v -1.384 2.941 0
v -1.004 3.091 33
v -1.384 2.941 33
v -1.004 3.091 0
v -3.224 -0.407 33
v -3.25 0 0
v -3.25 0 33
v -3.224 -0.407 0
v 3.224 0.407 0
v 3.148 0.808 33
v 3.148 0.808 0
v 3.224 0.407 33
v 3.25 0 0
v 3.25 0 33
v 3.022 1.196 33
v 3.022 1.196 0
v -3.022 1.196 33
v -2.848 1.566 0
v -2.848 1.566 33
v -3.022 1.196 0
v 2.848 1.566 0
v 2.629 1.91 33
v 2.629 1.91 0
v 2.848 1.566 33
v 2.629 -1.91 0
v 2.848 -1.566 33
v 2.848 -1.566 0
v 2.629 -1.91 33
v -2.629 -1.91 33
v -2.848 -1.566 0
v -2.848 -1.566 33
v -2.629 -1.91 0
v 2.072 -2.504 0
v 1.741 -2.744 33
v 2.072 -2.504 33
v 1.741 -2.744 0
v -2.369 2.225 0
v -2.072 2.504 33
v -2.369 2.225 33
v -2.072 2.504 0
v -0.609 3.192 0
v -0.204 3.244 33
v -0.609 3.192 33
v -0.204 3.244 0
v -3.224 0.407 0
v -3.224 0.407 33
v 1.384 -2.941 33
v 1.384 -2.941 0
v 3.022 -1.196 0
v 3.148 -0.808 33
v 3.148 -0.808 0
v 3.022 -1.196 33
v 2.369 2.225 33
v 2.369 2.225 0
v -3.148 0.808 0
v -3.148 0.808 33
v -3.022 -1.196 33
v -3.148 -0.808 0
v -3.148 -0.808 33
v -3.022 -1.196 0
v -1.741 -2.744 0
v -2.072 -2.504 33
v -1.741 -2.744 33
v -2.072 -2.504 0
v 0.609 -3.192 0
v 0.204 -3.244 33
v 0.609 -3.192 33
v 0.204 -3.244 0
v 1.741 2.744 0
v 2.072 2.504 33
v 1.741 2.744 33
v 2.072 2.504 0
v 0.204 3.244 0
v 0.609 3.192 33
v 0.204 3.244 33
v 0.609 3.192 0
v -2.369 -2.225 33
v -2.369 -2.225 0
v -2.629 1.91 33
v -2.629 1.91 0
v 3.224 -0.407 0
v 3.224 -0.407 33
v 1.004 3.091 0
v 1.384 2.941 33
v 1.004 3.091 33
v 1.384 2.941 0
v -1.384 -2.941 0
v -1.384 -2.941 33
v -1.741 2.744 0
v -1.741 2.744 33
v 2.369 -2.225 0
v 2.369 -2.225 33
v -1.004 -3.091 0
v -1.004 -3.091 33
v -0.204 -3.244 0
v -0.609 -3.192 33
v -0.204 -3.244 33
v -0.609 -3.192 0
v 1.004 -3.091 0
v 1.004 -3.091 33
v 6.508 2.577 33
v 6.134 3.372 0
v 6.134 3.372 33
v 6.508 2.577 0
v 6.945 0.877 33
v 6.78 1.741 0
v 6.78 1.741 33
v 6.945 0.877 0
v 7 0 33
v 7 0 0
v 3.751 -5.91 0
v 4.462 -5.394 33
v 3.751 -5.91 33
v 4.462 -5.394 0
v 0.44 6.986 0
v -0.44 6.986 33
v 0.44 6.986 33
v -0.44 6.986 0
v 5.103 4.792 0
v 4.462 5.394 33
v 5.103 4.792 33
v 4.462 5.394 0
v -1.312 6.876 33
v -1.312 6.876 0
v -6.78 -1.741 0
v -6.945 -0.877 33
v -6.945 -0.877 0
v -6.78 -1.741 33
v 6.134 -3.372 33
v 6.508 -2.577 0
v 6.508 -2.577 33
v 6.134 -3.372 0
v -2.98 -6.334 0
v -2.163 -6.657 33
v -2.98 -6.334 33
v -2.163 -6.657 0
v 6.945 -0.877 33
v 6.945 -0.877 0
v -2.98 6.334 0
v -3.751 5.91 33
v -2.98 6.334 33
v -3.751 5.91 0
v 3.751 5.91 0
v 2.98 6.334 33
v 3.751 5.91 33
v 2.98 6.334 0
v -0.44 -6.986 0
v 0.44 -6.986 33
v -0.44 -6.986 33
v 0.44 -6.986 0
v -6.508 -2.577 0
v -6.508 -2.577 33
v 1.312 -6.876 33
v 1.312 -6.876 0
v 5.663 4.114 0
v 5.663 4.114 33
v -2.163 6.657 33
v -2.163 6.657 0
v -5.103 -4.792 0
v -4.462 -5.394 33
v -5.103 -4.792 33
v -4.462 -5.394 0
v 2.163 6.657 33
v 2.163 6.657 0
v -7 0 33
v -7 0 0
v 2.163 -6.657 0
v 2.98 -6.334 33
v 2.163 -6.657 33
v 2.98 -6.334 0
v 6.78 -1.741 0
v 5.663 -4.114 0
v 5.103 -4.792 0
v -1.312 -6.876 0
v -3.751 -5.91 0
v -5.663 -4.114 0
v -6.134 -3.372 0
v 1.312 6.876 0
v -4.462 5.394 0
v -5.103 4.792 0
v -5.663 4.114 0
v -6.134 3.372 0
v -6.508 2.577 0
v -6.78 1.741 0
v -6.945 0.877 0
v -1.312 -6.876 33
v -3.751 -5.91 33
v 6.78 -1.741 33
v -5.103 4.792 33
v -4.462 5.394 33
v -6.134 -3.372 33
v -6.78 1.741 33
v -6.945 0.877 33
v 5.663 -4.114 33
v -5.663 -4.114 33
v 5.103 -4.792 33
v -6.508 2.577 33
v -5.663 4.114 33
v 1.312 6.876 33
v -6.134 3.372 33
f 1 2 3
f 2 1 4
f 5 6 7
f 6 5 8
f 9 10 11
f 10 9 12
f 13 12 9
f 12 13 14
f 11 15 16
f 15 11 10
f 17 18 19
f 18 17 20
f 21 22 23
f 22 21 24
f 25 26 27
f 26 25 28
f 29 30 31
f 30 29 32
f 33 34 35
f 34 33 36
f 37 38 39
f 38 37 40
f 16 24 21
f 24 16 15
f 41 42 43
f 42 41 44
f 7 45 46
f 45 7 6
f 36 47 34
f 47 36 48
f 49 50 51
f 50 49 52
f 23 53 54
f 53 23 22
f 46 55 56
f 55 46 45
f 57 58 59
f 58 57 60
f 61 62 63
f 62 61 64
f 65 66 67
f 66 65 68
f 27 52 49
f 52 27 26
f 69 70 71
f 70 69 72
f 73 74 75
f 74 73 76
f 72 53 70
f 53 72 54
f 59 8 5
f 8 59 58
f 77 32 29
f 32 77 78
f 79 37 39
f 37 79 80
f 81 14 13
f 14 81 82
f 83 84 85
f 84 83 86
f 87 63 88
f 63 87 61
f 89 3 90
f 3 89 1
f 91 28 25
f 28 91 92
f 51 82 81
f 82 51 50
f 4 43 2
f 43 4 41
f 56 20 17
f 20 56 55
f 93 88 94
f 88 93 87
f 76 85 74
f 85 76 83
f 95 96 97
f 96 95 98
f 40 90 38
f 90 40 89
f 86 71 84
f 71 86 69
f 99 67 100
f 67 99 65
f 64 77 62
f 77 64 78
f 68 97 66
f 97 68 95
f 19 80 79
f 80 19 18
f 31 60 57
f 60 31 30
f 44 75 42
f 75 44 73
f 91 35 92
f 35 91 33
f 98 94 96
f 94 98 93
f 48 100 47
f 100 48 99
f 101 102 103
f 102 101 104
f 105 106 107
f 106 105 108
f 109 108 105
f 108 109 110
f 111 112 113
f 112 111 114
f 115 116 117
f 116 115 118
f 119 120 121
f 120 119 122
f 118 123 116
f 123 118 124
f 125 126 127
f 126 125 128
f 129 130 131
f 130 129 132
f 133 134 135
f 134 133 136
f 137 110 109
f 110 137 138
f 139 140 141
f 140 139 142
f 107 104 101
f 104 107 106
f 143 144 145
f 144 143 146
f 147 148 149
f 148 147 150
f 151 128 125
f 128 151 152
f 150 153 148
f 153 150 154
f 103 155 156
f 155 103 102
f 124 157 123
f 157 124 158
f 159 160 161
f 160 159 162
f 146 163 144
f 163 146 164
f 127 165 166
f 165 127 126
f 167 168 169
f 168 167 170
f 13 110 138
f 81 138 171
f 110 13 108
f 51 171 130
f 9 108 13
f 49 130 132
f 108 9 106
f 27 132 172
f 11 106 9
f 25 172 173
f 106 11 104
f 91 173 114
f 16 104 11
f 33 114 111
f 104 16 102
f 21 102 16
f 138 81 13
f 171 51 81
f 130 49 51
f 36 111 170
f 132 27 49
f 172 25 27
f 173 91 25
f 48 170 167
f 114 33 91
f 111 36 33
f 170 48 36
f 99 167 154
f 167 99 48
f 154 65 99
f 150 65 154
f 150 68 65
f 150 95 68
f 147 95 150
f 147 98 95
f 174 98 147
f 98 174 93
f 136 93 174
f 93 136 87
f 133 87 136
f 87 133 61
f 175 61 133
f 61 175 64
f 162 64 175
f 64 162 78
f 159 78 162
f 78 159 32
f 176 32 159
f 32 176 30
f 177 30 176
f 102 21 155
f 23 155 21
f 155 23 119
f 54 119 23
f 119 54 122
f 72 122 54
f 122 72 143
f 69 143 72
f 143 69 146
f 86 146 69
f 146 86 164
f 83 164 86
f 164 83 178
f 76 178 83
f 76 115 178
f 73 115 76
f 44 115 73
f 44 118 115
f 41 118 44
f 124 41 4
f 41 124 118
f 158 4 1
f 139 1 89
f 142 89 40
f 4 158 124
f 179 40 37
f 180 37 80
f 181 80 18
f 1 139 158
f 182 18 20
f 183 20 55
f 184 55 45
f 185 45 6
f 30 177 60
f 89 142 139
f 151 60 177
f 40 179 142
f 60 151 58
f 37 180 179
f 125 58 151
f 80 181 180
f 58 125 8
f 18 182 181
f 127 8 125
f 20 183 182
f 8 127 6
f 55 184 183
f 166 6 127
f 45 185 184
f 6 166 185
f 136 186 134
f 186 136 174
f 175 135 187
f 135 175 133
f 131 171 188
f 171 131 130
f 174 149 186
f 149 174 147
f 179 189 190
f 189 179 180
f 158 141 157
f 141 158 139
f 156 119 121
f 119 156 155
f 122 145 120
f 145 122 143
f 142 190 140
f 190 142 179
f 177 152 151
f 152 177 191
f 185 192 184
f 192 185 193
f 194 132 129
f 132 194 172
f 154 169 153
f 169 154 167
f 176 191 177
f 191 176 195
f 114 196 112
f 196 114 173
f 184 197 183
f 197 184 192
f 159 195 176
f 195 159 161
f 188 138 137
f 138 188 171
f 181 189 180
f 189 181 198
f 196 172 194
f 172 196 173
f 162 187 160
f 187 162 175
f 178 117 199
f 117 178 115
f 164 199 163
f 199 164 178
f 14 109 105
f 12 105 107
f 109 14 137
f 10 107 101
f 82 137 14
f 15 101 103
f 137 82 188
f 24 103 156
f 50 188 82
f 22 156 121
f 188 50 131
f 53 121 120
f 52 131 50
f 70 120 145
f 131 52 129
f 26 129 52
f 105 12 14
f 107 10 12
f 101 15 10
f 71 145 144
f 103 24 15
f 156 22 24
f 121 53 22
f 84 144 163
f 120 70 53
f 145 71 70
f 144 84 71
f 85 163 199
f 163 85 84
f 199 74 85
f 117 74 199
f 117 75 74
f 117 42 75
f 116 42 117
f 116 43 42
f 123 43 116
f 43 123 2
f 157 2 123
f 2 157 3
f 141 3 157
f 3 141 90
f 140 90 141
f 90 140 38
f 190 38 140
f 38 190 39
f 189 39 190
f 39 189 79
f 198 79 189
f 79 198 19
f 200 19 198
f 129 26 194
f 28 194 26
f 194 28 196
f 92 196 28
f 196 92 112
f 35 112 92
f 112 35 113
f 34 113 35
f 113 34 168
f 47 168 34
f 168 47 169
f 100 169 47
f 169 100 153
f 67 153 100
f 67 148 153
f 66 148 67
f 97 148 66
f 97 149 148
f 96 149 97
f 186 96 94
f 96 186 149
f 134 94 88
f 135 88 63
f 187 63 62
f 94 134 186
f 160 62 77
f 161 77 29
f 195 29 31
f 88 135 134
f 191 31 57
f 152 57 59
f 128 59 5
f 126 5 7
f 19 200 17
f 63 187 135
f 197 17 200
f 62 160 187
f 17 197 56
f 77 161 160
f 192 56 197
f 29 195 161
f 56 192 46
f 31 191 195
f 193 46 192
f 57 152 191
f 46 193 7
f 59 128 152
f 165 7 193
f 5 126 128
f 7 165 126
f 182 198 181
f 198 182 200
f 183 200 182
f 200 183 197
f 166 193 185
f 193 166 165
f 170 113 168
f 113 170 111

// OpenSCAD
$fn = 50;


difference() {
	union() {
		*color(alpha = 1.0000000000, c = "gray") {
			translate(v = [0, 7, 0]) {
				linear_extrude(height = 1) {
					text(font = "Arial:style=Bold", halign = "center", size = 4.5000000000, text = "COMMENT plate main", valign = "center");
				}
			}
		}
		cylinder(h = 33, r = 7.0000000000);
	}
	union() {
		*color(alpha = 1.0000000000, c = "gray") {
			translate(v = [0, 7, 0]) {
				linear_extrude(height = 1) {
					text(font = "Arial:style=Bold", halign = "center", size = 4.5000000000, text = "COMMENT holes main", valign = "center");
				}
			}
		}
		translate(v = [0, 0, -100]) {
			cylinder(h = 200, r = 3.2500000000);
		}
		translate(v = [0, 0, -100]) {
			cylinder(h = 200, r = 1.8000000000);
		}
	}
}
